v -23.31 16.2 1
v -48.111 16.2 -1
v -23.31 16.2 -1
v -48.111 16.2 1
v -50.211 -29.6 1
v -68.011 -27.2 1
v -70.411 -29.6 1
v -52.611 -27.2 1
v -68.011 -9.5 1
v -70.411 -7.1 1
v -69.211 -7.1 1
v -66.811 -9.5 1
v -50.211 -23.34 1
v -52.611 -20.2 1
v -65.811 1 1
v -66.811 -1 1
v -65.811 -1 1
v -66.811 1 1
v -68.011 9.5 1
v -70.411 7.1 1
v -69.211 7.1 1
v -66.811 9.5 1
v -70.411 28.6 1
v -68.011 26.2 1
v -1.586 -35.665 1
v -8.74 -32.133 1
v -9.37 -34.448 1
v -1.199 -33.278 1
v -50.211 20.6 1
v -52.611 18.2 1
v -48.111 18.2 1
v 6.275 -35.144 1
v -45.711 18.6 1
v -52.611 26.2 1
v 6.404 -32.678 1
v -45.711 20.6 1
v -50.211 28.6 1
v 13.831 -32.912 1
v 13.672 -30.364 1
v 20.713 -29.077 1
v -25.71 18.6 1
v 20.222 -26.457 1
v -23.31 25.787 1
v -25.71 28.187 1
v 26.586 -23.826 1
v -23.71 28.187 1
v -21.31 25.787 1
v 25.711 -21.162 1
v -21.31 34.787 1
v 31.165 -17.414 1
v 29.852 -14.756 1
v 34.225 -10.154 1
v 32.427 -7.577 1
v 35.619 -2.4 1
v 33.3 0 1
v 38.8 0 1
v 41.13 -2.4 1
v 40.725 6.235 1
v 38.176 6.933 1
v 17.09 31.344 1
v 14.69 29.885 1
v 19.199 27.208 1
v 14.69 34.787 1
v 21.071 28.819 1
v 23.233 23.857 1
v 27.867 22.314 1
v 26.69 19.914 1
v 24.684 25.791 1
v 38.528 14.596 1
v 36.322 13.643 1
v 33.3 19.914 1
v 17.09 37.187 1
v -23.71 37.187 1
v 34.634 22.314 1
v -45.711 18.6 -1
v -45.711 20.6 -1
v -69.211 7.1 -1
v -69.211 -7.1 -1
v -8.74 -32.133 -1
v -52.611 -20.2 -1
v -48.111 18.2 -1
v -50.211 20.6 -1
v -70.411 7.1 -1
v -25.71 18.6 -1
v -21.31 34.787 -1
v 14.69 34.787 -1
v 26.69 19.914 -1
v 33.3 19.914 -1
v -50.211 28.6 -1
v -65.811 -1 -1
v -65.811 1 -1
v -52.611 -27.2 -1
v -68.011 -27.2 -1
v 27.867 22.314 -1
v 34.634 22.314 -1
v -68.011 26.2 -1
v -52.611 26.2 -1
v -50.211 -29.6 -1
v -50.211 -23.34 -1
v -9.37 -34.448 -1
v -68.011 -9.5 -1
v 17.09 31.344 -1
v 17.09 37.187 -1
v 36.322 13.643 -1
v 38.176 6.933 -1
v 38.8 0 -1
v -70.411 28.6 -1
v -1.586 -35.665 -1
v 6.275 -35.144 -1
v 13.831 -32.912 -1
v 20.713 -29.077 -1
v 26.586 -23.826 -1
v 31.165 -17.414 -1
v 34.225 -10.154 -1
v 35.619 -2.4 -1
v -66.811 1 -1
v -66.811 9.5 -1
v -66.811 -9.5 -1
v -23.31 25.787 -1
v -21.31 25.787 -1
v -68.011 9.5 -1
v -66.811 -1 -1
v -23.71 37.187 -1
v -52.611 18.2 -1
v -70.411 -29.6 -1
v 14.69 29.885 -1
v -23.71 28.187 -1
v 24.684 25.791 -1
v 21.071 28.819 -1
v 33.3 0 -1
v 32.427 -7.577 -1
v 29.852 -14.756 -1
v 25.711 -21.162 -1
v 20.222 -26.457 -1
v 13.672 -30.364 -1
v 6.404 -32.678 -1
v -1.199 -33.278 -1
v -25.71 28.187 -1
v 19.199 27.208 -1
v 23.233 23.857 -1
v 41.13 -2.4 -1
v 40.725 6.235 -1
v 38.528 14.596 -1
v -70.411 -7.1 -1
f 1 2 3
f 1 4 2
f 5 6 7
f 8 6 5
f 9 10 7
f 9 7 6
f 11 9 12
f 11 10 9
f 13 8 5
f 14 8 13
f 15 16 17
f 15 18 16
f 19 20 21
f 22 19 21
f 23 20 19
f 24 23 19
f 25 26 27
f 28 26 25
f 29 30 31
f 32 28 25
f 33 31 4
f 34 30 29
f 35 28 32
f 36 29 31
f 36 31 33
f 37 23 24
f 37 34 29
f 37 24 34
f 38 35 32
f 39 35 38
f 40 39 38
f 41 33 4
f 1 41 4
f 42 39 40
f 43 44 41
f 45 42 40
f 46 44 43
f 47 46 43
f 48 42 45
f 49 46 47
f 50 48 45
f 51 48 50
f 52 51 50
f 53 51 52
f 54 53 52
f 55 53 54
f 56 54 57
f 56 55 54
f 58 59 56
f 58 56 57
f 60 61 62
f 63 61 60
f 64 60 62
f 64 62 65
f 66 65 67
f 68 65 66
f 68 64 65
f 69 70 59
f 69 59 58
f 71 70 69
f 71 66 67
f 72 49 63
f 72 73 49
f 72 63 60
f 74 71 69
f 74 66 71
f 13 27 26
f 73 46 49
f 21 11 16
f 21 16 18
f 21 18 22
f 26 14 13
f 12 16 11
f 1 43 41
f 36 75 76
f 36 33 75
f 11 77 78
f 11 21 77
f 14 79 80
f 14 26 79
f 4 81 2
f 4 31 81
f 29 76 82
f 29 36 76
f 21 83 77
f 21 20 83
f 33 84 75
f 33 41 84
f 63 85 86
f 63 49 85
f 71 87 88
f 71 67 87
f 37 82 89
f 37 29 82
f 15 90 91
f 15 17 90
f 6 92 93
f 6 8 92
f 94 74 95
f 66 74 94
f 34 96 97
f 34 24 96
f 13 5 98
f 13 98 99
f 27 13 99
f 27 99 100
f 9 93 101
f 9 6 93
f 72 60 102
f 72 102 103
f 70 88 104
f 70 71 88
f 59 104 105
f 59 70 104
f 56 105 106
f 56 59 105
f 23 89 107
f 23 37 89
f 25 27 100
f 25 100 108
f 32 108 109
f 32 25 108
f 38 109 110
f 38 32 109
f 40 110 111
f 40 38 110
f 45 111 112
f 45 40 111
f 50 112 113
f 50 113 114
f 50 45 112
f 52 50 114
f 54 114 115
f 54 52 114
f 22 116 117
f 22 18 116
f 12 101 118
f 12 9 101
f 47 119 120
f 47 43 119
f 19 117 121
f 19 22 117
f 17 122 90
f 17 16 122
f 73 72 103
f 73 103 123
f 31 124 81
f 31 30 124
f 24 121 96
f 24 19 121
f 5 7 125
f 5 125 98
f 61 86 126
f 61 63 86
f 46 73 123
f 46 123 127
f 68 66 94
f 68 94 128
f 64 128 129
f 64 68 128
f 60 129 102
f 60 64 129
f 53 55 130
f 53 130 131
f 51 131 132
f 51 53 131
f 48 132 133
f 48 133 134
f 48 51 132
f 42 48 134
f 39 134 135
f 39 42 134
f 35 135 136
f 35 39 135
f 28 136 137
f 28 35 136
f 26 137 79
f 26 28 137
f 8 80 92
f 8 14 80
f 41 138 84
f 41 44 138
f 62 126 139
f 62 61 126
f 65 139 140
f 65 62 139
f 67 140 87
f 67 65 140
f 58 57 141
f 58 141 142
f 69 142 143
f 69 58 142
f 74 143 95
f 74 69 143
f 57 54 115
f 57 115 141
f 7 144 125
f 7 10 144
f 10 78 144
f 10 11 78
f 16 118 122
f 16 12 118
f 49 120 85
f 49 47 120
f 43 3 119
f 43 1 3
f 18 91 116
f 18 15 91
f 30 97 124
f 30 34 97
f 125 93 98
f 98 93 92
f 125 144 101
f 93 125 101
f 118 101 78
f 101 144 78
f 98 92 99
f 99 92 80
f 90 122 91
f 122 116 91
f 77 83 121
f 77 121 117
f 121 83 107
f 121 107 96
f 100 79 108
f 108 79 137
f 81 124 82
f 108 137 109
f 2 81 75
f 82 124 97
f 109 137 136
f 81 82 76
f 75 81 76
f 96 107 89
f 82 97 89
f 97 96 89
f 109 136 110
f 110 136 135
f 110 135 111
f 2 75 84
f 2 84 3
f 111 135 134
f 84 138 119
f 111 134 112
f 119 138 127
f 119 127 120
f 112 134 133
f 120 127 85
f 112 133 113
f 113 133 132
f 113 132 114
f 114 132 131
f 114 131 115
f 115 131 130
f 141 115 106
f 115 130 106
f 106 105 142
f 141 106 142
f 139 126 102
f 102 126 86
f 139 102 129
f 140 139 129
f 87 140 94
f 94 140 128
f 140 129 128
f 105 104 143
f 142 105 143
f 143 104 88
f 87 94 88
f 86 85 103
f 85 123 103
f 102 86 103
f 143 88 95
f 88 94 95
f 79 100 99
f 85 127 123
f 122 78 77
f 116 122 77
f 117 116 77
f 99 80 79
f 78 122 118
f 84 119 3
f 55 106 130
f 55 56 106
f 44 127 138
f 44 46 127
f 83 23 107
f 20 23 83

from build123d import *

# Parameters (mm, degrees)
F1_DEPTH = 1


with BuildPart() as f1:
    # F0 (on Top) → F1 (new body, symmetric)
    with BuildSketch(Plane.XY):
        with BuildLine():
            Line((-70.4106393839, -7.0998651044), (-70.4106393839, -29.5998683792))
            Line((-70.4106393839, -29.5998683792), (-50.2106361091, -29.5998683792))
            Line((-50.2106361091, -29.5998683792), (-50.2106361091, -23.339858427))
            Line((-50.2106361091, -23.339858427), (-9.3698940826, -34.4484426613))
            ThreePointArc((-9.3698940826, -34.4484426613), (20.713103481, -29.0767512129), (35.6192379066, -2.4000016374))
            Line((35.6192379066, -2.4000016374), (41.13003923, -2.4000016374))
            ThreePointArc((41.13003923, -2.4000016374), (39.8466372276, 10.4730910707), (34.6344497709, 22.3135614366))
            Line((34.6344497709, 22.3135614366), (27.8674558028, 22.3135614366))
            ThreePointArc((27.8674558028, 22.3135614366), (22.9275534697, 27.3645282949), (17.0897025746, 31.3437742274))
            Line((17.0897025746, 31.3437742274), (17.0897025746, 37.1873599962))
            Line((17.0897025746, 37.1873599962), (-23.7103007001, 37.1873599962))
            Line((-23.7103007001, 37.1873599962), (-23.7103007001, 28.1873608961))
            Line((-23.7103007001, 28.1873608961), (-25.7103007001, 28.1873608961))
            Line((-25.7103007001, 28.1873608961), (-25.7103007001, 18.6000016374))
            Line((-25.7103007001, 18.6000016374), (-45.7106326896, 18.6000016374))
            Line((-45.7106326896, 18.6000016374), (-45.7106326896, 20.6000016374))
            Line((-45.7106326896, 20.6000016374), (-50.2106326896, 20.6000016374))
            Line((-50.2106326896, 20.6000016374), (-50.2106326896, 28.6000016374))
            Line((-50.2106326896, 28.6000016374), (-70.4106393839, 28.6000016374))
            Line((-70.4106393839, 28.6000016374), (-70.4106393839, 7.0999983626))
            Line((-70.4106393839, 7.0999983626), (-69.2106393839, 7.0999983626))
            Line((-69.2106393839, 7.0999983626), (-69.2106393839, 1.4001348956))
            Line((-69.2106393839, 1.4001348956), (-69.2106393839, -7.0998651044))
            Line((-69.2106393839, -7.0998651044), (-70.4106393839, -7.0998651044))
        make_face()
        with BuildLine():
            ThreePointArc((33.3, 0), (20.2218755926, -26.4568657916), (-8.7399848359, -32.132579496))
            Line((-8.7399848359, -32.132579496), (-52.6106377465, -20.1998667418))
            Line((-52.6106377465, -20.1998667418), (-52.6106377465, -27.1998667418))
            Line((-52.6106377465, -27.1998667418), (-68.0106377465, -27.1998667418))
            Line((-68.0106377465, -27.1998667418), (-68.0106377465, -9.4998667418))
            Line((-68.0106377465, -9.4998667418), (-66.8106377465, -9.4998667418))
            Line((-66.8106377465, -9.4998667418), (-66.8106377465, -0.9998667418))
            Line((-66.8106377465, -0.9998667418), (-65.8106377465, -0.9998667418))
            Line((-65.8106377465, -0.9998667418), (-65.8106377465, 0))
            Line((-65.8106377465, 0), (-65.8106377465, 1))
            Line((-65.8106377465, 1), (-66.8106377465, 1))
            Line((-66.8106377465, 1), (-66.8106377465, 9.5))
            Line((-66.8106377465, 9.5), (-68.0106377465, 9.5))
            Line((-68.0106377465, 9.5), (-68.0106377465, 26.2))
            Line((-68.0106377465, 26.2), (-52.6106343269, 26.2))
            Line((-52.6106343269, 26.2), (-52.6106343269, 18.2))
            Line((-52.6106343269, 18.2), (-48.1106343269, 18.2))
            Line((-48.1106343269, 18.2), (-48.1106343269, 16.2))
            Line((-48.1106343269, 16.2), (-23.3102990627, 16.2))
            Line((-23.3102990627, 16.2), (-23.3102990627, 25.7873592587))
            Line((-23.3102990627, 25.7873592587), (-21.3102990627, 25.7873592587))
            Line((-21.3102990627, 25.7873592587), (-21.3102990627, 34.7873583588))
            Line((-21.3102990627, 34.7873583588), (14.6897009373, 34.7873583588))
            Line((14.6897009373, 34.7873583588), (14.6897009373, 29.8848236798))
            ThreePointArc((14.6897009373, 29.8848236798), (21.2819230973, 25.6119063969), (26.6897009373, 19.9135597993))
            Line((26.6897009373, 19.9135597993), (33.3000020439, 19.9135597993))
            ThreePointArc((33.3000020439, 19.9135597993), (37.3997331495, 10.3295672876), (38.8, 0))
            Line((38.8, 0), (33.3, 0))
        make_face(mode=Mode.SUBTRACT)
    extrude(amount=F1_DEPTH, both=True)


solid = f1.part
